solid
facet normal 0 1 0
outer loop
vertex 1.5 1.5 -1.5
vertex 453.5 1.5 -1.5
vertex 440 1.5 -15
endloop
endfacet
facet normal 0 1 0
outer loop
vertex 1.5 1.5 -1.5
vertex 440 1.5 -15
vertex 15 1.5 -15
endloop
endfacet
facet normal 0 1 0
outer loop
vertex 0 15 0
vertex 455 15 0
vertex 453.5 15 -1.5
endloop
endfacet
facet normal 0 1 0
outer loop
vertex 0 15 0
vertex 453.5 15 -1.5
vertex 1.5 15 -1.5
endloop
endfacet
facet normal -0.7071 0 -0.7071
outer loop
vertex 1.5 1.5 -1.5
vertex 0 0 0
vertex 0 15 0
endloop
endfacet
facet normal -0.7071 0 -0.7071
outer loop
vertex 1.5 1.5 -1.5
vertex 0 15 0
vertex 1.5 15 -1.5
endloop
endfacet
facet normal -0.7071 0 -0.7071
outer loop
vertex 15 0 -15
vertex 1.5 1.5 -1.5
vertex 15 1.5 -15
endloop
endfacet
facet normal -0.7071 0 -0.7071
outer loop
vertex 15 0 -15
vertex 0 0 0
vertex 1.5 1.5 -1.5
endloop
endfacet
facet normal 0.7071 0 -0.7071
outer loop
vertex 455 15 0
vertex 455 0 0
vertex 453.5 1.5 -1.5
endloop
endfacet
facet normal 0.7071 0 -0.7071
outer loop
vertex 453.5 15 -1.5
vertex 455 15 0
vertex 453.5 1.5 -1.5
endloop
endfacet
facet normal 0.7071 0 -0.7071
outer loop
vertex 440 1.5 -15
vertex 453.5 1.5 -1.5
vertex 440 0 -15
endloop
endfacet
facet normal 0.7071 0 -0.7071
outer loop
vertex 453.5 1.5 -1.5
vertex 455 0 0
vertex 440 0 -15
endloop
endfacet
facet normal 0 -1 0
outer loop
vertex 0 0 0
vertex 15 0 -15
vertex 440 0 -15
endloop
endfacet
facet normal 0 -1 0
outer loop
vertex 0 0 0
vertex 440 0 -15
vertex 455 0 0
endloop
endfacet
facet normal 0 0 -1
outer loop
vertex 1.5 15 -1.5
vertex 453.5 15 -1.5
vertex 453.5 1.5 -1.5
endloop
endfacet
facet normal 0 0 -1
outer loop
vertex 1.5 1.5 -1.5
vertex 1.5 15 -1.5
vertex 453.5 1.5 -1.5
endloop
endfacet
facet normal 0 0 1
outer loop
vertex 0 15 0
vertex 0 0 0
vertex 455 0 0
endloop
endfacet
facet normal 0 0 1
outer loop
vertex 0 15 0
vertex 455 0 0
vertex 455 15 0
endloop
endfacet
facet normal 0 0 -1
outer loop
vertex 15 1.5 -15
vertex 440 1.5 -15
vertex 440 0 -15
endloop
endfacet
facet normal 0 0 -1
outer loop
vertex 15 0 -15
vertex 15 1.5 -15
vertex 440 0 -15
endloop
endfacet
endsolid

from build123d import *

# Parameters (mm, degrees)
EXTRUDE_1_DEPTH     = 455
CUT_EXTRUDE_1_DEPTH = 16


with BuildPart() as part:
    # Эскиз1 → Бобышка-Вытянуть1 (new body)
    with BuildSketch(Plane(origin=(0, 0, 0), x_dir=(0, 0, -1), z_dir=(1, 0, 0))):
        Polygon((0, 0), (0, 15), (1.5, 15), (1.5, 1.5), (15, 1.5), (15, 0), align=None)
    extrude(amount=EXTRUDE_1_DEPTH)

    # Эскиз2 → Вырез-Вытянуть1 (cut, through all)
    with BuildSketch(Plane.XZ):
        Polygon((455, 0), (434.173753179, -20.826246821), (455, -20.826246821), align=None)
    cut_extrude_1 = extrude(amount=-CUT_EXTRUDE_1_DEPTH, mode=Mode.SUBTRACT)

    # Зеркальное отражение1: Вырез-Вытянуть1 across plane
    add(cut_extrude_1.mirror(Plane(origin=(227.5, 0, 0), x_dir=(0, 0, 1), z_dir=(1, 0, 0))), mode=Mode.SUBTRACT)


solid = part.part
